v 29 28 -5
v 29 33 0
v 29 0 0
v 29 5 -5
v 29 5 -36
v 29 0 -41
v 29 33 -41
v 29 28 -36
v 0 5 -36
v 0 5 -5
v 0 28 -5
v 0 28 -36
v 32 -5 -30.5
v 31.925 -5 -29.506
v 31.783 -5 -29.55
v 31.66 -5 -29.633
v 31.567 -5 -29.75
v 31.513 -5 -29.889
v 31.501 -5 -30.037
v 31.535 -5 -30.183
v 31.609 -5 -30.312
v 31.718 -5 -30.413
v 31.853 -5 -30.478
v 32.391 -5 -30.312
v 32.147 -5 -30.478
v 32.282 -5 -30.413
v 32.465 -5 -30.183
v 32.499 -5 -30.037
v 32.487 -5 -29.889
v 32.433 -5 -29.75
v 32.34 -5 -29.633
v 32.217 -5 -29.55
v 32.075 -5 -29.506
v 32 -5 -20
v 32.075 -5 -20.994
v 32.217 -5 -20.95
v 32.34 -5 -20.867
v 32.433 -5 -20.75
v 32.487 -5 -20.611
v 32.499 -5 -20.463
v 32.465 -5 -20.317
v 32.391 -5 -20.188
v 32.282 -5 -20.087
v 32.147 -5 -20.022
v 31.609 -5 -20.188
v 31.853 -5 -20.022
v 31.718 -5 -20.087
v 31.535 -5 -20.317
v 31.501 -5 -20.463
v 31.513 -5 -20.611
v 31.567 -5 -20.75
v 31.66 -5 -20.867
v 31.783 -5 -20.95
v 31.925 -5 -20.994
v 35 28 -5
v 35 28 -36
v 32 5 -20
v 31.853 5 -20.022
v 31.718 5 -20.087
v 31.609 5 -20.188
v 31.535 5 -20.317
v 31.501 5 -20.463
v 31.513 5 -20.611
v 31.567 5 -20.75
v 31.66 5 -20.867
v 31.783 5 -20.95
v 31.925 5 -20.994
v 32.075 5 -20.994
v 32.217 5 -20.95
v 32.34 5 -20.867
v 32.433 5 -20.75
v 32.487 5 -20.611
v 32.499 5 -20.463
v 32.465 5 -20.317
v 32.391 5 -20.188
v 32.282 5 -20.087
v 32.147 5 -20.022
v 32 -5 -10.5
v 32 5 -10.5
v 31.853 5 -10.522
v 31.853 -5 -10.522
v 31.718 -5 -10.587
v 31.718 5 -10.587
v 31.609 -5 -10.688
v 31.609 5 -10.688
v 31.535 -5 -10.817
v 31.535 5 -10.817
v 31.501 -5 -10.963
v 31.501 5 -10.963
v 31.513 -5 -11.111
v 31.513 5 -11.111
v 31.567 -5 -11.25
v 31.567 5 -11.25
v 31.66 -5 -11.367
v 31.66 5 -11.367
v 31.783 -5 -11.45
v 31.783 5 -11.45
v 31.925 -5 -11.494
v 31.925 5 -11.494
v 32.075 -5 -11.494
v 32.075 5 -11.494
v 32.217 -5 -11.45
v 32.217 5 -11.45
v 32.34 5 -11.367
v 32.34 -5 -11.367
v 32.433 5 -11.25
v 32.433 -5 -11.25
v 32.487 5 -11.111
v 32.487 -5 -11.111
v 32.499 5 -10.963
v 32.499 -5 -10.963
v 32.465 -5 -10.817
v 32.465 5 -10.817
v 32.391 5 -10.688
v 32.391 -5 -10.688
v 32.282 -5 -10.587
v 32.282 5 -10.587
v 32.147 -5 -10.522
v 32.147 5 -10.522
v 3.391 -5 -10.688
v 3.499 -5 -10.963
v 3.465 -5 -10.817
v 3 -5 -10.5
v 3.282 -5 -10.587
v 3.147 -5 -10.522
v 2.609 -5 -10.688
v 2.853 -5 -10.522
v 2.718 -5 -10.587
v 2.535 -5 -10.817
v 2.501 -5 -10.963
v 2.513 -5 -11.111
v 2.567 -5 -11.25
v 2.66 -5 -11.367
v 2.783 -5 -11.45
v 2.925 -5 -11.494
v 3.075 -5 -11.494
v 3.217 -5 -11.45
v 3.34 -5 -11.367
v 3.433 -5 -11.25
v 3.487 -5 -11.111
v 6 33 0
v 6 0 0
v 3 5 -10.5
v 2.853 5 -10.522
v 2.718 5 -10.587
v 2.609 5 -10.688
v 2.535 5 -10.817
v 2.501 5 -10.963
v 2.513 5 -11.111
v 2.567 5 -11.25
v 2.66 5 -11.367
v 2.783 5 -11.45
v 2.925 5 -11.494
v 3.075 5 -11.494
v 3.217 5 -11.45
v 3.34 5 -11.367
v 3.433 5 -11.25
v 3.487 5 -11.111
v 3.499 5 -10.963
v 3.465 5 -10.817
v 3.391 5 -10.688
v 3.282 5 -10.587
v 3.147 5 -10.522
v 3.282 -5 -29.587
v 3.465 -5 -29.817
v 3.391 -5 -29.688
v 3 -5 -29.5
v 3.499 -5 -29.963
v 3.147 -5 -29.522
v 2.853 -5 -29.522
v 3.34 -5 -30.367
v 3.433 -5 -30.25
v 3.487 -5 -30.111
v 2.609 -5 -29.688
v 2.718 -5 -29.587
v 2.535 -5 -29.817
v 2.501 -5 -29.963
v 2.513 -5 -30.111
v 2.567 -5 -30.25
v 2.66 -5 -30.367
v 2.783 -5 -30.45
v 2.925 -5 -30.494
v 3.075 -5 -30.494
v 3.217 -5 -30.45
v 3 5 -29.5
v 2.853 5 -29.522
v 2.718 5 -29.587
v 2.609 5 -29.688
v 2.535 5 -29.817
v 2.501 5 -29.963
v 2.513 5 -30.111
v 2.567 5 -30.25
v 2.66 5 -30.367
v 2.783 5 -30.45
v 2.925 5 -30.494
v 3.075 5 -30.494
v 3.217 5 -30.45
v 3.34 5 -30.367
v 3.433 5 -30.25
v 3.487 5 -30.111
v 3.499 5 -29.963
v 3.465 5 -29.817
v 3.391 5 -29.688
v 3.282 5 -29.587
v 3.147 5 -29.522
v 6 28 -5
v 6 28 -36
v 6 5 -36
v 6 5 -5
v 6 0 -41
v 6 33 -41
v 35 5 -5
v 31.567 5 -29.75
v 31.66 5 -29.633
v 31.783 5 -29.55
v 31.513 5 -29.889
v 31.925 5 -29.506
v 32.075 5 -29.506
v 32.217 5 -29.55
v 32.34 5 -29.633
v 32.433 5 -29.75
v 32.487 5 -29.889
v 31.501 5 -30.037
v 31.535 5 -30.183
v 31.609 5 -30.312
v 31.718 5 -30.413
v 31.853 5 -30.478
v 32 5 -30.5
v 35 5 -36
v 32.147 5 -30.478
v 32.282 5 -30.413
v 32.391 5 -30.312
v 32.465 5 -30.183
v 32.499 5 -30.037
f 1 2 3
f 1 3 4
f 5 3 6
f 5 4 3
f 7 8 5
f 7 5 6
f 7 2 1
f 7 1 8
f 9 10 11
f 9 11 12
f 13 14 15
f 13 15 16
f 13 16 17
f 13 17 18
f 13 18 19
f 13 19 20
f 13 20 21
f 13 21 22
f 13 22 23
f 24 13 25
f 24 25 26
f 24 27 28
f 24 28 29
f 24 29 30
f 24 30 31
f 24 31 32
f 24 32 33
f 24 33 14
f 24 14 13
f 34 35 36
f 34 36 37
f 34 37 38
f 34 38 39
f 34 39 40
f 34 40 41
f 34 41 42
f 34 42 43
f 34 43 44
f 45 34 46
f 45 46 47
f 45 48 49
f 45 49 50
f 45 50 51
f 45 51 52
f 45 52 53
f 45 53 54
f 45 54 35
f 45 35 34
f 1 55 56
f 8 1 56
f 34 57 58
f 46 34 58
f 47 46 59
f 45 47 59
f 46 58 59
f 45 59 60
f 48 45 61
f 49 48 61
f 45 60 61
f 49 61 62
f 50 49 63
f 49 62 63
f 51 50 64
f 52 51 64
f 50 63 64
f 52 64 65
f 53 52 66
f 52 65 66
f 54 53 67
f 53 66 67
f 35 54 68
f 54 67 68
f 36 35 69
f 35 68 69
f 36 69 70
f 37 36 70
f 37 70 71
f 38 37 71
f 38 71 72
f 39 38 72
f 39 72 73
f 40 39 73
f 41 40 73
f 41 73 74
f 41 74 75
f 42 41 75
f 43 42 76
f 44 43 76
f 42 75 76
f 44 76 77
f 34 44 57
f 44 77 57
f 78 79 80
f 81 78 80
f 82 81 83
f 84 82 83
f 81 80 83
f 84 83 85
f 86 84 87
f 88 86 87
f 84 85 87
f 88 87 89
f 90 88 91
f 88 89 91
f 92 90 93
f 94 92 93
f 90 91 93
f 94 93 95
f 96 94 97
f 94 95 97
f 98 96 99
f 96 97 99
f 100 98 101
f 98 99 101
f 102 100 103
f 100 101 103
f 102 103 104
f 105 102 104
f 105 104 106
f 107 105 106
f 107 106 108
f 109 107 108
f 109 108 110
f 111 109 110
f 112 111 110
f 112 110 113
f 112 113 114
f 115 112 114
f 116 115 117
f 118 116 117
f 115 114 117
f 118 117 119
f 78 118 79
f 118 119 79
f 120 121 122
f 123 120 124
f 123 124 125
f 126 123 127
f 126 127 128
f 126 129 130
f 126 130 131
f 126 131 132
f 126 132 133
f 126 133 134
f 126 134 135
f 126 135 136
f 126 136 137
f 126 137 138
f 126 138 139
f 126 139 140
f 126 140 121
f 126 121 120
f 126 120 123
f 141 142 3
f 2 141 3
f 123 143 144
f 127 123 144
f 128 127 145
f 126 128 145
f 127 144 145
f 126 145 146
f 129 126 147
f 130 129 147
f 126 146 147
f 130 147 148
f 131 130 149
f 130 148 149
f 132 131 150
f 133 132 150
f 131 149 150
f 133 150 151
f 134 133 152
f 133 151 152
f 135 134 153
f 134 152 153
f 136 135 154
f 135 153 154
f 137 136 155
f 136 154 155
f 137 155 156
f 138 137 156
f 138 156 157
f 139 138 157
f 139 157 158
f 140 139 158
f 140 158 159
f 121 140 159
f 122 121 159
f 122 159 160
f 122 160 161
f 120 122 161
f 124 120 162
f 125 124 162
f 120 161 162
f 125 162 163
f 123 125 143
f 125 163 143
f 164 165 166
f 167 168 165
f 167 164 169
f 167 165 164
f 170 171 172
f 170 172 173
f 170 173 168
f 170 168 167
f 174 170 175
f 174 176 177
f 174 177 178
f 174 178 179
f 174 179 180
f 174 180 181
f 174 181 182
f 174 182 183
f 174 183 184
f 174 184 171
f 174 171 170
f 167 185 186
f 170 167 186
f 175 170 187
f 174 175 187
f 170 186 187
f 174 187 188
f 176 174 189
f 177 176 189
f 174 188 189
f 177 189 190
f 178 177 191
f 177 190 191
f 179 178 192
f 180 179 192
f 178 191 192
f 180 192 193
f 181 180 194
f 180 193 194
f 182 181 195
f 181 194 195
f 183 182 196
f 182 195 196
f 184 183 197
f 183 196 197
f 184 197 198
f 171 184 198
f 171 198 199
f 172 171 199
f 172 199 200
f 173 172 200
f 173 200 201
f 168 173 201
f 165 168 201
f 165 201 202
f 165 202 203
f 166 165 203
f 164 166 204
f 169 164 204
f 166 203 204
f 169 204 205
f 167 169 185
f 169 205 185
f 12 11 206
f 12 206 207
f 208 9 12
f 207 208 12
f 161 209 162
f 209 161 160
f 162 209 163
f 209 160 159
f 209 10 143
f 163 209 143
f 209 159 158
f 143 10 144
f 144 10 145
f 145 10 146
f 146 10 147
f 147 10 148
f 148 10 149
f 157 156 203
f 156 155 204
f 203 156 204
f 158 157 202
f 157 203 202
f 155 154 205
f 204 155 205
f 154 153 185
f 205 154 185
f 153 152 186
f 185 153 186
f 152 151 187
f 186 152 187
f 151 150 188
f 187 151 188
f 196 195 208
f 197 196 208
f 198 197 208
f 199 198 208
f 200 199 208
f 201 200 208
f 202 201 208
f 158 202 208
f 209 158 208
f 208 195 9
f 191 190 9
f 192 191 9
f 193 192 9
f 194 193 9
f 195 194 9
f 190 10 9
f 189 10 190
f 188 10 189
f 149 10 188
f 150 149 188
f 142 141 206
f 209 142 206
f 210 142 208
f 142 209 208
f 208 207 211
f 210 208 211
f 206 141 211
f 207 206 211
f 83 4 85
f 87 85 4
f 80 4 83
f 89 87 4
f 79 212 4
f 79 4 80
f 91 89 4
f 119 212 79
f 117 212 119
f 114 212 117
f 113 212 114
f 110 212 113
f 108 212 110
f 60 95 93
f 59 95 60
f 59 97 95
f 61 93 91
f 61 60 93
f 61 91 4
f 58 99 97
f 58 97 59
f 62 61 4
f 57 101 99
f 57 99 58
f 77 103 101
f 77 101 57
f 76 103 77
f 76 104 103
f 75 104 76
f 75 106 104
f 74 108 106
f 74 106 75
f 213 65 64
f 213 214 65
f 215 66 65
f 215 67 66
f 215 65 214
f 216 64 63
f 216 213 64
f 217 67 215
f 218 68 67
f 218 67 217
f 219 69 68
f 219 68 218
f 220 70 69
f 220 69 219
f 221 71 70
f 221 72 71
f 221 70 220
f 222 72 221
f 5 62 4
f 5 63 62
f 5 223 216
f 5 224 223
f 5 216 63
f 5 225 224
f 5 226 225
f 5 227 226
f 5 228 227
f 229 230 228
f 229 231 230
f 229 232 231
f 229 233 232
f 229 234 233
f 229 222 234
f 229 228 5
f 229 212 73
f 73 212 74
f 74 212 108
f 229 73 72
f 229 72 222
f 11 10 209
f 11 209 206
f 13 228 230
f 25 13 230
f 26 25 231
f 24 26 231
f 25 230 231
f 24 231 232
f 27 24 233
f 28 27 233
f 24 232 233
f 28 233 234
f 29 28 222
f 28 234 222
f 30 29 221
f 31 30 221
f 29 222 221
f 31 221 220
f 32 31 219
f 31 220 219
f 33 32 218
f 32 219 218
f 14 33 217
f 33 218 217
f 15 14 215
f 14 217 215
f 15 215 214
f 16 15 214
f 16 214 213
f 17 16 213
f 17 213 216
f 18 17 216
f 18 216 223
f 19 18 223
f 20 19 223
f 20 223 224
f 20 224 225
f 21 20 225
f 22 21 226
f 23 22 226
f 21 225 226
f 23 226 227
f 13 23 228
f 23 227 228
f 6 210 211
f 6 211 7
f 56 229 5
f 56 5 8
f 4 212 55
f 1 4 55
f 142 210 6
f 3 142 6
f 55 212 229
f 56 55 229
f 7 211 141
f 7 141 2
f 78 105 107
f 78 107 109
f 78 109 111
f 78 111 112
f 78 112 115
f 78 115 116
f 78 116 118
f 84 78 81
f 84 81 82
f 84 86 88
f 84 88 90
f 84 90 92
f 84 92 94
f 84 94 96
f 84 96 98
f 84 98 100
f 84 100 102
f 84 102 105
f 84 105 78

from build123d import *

# Parameters (mm, degrees)
SKETCH_1_W          = 35
SKETCH_1_H          = 41
EXTRUDE_1_DEPTH     = 33
SKETCH_3_W          = 41
SKETCH_3_H          = 33
SKETCH_3_W_2        = 31
SKETCH_3_H_2        = 23
CUT_EXTRUDE_1_DEPTH = 6
SKETCH_2_R          = 0.5
EXTRUDE_2_DEPTH     = 10


with BuildPart() as part:
    # 草图1 → 凸台-拉伸1 (new body)
    with BuildSketch(Plane(origin=(0, 0, 0), x_dir=(1, 0, 0), z_dir=(0, 1, 0))):
        with Locations((17.5, 20.5)):
            Rectangle(SKETCH_1_W, SKETCH_1_H)
    extrude(amount=EXTRUDE_1_DEPTH)

    # 草图3 → 切除-拉伸1 (cut)
    with BuildSketch(Plane(origin=(35, 0, 0), x_dir=(0, 0, -1), z_dir=(1, 0, 0))):
        with Locations((20.5, 16.5)):
            Rectangle(SKETCH_3_W, SKETCH_3_H)
        with Locations((20.5, 16.5)):
            Rectangle(SKETCH_3_W_2, SKETCH_3_H_2, mode=Mode.SUBTRACT)
    cut_extrude_1 = extrude(amount=-CUT_EXTRUDE_1_DEPTH, mode=Mode.SUBTRACT)

    # 镜向9: 切除-拉伸1 across plane
    add(cut_extrude_1.mirror(Plane(origin=(17.5, 0, 0), x_dir=(0, 0, 1), z_dir=(1, 0, 0))), mode=Mode.SUBTRACT)

    # 草图2 → 凸台-拉伸2 (add)
    with BuildSketch(Plane.XZ.offset(-5)):
        with Locations(Location((3, -11, 0), (0, 0, 90))):
            Circle(SKETCH_2_R)
        with Locations(Location((3, -30, 0), (0, 0, 90))):
            Circle(SKETCH_2_R)
        with Locations(Location((32, -30, 0), (0, 0, 270))):
            Circle(SKETCH_2_R)
        with Locations(Location((32, -11, 0), (0, 0, 90))):
            Circle(SKETCH_2_R)
        with Locations(Location((32, -20.5, 0), (0, 0, 90))):
            Circle(SKETCH_2_R)
    extrude(amount=EXTRUDE_2_DEPTH)


solid = part.part
